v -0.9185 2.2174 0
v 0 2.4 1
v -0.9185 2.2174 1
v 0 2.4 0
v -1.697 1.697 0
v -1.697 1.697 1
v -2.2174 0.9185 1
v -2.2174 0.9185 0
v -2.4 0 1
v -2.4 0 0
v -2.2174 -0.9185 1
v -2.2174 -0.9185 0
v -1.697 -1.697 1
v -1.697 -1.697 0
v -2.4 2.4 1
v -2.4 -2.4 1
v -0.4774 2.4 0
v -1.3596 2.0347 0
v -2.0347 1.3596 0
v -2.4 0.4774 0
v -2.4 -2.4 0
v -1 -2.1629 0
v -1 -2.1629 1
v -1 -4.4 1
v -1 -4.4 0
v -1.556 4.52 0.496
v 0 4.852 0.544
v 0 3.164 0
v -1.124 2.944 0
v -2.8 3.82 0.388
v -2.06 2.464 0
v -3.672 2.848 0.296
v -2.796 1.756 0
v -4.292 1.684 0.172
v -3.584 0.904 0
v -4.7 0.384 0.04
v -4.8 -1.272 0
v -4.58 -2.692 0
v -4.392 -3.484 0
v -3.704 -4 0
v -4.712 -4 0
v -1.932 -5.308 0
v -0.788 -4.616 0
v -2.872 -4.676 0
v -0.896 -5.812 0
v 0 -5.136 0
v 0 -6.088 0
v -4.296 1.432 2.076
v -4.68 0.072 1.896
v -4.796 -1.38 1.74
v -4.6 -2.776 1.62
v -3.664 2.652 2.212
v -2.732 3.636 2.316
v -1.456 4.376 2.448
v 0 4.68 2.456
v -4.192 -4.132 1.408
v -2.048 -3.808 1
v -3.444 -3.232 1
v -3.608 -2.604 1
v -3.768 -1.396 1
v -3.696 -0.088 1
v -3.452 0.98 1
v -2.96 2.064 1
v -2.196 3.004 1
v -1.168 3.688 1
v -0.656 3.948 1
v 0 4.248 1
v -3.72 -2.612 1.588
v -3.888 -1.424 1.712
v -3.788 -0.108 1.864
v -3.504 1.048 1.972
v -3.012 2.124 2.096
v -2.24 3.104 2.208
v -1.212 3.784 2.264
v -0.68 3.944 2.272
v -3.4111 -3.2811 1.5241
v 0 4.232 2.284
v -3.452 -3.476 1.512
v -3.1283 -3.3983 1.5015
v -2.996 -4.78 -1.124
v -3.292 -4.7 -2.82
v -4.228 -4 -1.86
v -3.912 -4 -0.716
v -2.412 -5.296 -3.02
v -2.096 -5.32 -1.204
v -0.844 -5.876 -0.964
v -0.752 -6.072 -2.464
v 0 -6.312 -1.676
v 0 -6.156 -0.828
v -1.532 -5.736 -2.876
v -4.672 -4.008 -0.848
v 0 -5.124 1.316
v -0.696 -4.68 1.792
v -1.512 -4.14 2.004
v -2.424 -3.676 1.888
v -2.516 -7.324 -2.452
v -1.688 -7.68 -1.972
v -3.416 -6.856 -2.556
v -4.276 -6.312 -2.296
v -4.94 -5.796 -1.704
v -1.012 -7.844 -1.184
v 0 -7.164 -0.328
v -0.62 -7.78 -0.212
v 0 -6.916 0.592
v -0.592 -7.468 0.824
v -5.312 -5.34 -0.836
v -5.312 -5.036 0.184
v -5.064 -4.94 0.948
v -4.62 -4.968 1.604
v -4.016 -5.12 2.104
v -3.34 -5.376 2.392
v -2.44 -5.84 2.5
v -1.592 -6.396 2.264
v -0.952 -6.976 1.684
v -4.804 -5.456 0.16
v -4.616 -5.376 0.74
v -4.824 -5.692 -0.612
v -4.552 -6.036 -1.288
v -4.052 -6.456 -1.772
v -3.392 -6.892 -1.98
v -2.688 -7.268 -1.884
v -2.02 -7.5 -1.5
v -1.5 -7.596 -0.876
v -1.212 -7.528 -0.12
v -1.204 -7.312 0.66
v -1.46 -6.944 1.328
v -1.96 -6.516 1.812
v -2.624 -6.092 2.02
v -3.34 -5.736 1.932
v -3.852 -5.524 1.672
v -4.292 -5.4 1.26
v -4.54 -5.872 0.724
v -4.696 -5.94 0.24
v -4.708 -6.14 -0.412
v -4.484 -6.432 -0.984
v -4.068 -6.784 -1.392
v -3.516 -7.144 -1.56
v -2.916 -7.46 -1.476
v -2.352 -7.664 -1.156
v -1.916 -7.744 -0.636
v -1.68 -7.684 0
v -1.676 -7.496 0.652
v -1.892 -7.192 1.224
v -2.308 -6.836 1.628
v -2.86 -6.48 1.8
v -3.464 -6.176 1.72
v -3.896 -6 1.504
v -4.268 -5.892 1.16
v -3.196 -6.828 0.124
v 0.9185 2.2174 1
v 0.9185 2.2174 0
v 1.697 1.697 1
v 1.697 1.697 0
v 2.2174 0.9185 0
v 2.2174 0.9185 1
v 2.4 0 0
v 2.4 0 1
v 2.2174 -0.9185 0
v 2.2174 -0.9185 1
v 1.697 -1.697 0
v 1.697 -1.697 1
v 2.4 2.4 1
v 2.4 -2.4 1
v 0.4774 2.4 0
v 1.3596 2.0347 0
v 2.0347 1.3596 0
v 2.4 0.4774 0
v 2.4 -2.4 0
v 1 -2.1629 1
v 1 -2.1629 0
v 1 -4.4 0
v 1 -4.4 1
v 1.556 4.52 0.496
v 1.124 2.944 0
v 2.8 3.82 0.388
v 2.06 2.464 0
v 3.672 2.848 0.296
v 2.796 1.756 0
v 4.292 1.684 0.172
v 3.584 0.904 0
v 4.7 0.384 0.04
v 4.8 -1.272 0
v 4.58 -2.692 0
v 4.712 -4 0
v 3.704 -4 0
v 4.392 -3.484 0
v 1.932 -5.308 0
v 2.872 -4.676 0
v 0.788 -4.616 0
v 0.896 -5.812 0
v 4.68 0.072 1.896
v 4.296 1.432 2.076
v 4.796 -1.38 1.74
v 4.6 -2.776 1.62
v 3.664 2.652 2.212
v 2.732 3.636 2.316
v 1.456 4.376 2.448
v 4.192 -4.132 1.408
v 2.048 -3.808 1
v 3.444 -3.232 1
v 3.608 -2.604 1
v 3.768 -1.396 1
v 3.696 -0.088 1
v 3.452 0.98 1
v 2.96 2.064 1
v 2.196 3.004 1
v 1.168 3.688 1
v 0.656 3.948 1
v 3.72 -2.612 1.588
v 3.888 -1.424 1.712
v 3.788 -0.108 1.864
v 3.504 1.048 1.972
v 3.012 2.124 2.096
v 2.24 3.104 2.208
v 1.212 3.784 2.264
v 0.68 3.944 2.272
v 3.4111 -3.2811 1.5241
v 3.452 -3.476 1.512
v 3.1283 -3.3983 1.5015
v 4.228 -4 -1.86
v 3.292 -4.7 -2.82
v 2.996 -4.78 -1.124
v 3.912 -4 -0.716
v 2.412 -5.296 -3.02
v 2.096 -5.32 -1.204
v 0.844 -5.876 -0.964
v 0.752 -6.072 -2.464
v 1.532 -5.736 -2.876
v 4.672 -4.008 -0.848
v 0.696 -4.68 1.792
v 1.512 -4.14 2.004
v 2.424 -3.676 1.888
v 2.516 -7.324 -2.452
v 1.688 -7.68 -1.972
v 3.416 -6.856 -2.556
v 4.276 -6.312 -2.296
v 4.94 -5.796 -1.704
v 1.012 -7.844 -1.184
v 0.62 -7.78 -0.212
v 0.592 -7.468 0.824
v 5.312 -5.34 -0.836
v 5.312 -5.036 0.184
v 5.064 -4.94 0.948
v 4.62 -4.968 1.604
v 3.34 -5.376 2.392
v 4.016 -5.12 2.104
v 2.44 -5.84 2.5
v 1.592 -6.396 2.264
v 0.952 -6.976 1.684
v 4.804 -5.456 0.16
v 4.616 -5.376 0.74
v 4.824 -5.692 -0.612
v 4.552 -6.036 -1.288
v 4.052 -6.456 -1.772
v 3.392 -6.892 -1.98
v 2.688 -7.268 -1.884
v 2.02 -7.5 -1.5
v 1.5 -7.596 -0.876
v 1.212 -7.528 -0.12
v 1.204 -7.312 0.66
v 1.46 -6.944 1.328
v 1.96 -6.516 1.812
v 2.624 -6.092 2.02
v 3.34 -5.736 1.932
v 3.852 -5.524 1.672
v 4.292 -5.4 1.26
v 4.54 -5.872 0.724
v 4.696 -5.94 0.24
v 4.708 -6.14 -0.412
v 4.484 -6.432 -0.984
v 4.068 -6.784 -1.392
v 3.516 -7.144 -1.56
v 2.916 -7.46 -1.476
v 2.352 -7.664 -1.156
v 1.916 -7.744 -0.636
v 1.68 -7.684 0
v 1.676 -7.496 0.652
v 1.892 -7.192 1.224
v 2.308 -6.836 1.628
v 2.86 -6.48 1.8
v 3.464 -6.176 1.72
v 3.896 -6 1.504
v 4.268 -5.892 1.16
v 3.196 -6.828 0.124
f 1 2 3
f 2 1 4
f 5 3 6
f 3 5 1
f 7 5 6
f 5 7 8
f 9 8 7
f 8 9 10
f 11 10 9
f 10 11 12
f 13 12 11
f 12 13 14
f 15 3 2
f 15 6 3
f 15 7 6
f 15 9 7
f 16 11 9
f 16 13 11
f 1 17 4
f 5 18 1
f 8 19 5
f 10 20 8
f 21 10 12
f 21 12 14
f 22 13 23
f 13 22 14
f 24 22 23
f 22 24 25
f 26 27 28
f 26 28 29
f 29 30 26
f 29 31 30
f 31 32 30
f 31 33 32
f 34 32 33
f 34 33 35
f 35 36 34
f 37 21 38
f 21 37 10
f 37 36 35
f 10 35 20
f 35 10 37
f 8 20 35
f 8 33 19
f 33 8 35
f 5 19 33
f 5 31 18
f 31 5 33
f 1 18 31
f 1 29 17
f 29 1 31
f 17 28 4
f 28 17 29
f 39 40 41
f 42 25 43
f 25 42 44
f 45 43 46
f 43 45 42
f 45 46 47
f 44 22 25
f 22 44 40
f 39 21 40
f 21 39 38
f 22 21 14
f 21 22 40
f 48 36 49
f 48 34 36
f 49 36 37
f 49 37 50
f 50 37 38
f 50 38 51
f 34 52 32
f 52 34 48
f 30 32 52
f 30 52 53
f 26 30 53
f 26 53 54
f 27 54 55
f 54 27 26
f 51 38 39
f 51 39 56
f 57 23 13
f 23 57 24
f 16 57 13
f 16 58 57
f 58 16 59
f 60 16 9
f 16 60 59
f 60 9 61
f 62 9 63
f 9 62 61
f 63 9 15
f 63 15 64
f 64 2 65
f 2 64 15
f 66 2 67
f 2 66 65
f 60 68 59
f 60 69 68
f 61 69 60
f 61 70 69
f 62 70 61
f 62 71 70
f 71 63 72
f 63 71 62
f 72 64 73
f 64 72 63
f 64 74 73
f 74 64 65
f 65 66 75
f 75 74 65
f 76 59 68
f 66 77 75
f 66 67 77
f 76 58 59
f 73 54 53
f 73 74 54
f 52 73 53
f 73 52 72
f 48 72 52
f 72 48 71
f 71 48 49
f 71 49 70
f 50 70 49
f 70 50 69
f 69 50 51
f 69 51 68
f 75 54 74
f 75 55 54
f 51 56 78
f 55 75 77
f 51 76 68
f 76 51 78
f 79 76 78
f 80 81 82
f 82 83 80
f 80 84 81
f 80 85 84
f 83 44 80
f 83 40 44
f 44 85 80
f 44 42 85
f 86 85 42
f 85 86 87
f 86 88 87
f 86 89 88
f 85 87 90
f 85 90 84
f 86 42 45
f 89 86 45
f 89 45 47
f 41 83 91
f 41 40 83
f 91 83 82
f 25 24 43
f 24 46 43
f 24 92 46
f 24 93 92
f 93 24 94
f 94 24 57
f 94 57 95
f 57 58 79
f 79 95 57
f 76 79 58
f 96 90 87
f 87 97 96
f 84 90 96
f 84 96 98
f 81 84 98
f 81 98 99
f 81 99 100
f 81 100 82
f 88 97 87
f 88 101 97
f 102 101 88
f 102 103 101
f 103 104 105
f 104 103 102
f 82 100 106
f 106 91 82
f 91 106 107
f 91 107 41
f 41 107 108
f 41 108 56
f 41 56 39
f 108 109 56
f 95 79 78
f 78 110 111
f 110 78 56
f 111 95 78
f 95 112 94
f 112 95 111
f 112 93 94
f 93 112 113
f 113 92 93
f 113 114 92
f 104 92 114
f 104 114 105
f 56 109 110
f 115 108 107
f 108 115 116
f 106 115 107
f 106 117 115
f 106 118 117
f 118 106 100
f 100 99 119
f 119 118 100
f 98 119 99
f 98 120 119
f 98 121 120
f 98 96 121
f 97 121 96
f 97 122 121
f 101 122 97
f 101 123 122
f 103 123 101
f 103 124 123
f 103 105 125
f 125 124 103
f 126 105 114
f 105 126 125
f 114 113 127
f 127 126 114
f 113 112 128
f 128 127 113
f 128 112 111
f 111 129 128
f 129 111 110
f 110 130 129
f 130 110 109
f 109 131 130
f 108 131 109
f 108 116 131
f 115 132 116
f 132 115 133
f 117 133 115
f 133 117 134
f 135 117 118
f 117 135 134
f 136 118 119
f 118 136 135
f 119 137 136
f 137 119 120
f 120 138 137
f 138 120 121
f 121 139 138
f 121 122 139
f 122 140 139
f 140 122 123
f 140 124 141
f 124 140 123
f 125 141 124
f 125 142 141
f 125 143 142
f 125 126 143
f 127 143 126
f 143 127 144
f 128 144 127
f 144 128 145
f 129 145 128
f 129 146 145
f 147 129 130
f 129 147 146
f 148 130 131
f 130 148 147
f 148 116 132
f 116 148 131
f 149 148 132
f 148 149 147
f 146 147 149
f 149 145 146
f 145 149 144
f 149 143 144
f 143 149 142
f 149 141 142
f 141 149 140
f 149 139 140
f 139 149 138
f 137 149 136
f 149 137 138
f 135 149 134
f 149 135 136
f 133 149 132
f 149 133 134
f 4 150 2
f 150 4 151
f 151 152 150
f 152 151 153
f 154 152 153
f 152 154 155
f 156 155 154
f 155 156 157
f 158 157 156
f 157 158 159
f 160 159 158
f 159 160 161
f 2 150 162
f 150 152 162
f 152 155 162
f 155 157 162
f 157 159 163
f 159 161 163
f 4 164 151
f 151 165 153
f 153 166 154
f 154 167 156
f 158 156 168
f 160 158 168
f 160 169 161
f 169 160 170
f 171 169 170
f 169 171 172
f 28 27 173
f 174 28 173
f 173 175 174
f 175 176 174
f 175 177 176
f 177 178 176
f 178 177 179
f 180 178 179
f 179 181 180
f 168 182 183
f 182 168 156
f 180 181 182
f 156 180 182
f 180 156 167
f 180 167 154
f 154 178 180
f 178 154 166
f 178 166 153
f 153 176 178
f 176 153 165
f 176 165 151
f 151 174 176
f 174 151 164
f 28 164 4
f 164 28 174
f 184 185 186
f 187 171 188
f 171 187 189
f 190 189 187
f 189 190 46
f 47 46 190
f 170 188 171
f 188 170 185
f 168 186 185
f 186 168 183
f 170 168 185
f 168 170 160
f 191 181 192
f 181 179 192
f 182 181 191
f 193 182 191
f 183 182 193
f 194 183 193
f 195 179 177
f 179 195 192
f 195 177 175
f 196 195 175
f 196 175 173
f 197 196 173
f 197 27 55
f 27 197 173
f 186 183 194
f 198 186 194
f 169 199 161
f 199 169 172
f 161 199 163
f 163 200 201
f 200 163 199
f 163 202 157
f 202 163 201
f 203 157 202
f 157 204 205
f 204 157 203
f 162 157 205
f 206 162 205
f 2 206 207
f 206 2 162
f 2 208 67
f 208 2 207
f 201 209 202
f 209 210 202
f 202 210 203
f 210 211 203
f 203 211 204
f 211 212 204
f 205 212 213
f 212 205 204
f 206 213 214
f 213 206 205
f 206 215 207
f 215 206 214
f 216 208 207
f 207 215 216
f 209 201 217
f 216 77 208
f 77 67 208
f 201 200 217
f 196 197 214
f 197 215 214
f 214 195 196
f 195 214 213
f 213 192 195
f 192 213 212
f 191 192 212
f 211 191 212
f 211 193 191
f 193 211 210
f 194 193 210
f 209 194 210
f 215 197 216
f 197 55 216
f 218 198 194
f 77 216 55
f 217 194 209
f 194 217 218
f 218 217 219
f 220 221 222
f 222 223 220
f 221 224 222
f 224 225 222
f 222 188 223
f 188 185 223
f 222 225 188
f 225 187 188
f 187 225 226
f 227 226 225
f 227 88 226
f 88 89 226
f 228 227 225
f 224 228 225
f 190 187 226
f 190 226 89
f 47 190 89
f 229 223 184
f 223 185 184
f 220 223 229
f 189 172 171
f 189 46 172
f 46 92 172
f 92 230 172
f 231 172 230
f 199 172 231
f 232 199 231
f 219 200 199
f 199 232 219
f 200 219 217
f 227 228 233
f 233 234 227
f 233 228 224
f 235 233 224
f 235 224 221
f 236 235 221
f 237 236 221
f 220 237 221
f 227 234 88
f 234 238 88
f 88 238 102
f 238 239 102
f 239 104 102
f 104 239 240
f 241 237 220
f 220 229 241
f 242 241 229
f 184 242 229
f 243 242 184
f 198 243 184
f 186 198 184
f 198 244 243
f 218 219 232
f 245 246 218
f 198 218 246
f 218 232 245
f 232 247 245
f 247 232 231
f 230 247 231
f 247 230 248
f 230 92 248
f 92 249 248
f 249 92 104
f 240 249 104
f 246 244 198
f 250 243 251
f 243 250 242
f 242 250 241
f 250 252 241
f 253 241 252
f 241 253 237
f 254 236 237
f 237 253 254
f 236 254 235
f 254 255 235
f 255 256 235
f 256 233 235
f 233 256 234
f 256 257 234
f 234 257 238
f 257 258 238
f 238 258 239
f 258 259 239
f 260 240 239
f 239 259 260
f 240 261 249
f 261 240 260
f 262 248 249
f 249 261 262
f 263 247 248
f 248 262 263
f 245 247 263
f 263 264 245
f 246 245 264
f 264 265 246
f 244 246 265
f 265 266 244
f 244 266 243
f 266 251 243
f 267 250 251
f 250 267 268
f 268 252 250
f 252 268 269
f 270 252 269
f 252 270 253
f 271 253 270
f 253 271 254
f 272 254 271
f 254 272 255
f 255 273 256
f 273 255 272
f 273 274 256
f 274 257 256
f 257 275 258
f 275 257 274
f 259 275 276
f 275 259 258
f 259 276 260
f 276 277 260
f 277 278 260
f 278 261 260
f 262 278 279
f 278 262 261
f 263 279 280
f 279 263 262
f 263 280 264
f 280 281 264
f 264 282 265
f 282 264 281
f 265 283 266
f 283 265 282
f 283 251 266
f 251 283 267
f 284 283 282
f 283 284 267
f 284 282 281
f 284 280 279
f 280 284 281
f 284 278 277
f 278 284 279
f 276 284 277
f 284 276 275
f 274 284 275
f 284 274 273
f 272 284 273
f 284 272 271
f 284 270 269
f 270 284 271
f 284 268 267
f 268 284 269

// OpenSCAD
use <../lib.scad>
use <s/66913s01.scad>
function ldraw_lib__66913() = [
// 0 Minifig Headset Around Neck
// 0 Name: 66913.dat
// 0 Author: Gerald Lasser [GeraldLasser]
// 0 !LDRAW_ORG Part UPDATE 2024-04
// 0 !LICENSE Licensed under CC BY 4.0 : see CAreadme.txt
// 
// 0 BFC CERTIFY CCW
  [0,"BFC","CERTIFY"],
  [0,"BFC","CCW"],
// 
// 0 !CATEGORY Minifig Neckwear
// 0 !KEYWORDS cover, Earmuff, Protection
// 
// 0 !HISTORY 2022-01-19 {LEGO Instructions App} Original part shape
// 0 !HISTORY 2022-01-19 [GeraldLasser] File preparation for LDraw Parts Tracker
// 0 !HISTORY 2024-05-28 [OrionP] Official Update 2024-04
// 
// 
// 1 16 0 0 0 1 0 0 0 1 0 0 0 1 s\66913s01.dat
  [1,16,0,0,0,1,0,0,0,1,0,0,0,1, ldraw_lib__s__66913s01()],
// 1 16 0 0 0 -1 0 0 0 1 0 0 0 1 s\66913s01.dat
  [1,16,0,0,0,-1,0,0,0,1,0,0,0,1, ldraw_lib__s__66913s01()],
// 
// 2 24 0 -3.29 -12.81 0 -1.48 -17.29
  [2,24,0,-3.29,-12.81,0,-1.48,-17.29],
// 2 24 0 -1.48 -17.29 0 .82 -17.91
  [2,24,0,-1.48,-17.29,0,.82,-17.91],
// 2 24 0 .82 -17.91 0 4.19 -15.78
  [2,24,0,.82,-17.91,0,4.19,-15.78],
// 2 24 0 -3.29 -12.81 0 0 -12.84
  [2,24,0,-3.29,-12.81,0,0,-12.84],
// 5 24 0 2.07 -15.39 0 4.19 -15.78 -2.11 2.41 -14.69 2.11 2.41 -14.69
  [5,24,0,2.07,-15.39,0,4.19,-15.78,-2.11,2.41,-14.69,2.11,2.41,-14.69],
// 5 24 0 -2.5 10.62 0 -5.71 10.58 1.64 -2.5 9.87 -1.64 -2.5 9.87
  [5,24,0,-2.5,10.62,0,-5.71,10.58,1.64,-2.5,9.87,-1.64,-2.5,9.87],
// 5 24 0 -1.36 12.13 0 0 7.91 3.89 -1.24 11.3 -3.89 -1.24 11.3
  [5,24,0,-1.36,12.13,0,0,7.91,3.89,-1.24,11.3,-3.89,-1.24,11.3],
// 5 24 0 0 -15.22 0 2.07 -15.39 -2.24 0 -14.53 2.24 0 -14.53
  [5,24,0,0,-15.22,0,2.07,-15.39,-2.24,0,-14.53,2.24,0,-14.53],
// 5 24 0 -5.71 10.58 0 -6.14 11.7 1.7 -5.68 9.86 -1.7 -5.68 9.86
  [5,24,0,-5.71,10.58,0,-6.14,11.7,1.7,-5.68,9.86,-1.7,-5.68,9.86],
// 5 24 0 -6.14 11.7 0 -1.36 12.13 3.89 -1.24 11.3 -3.89 -1.24 11.3
  [5,24,0,-6.14,11.7,0,-1.36,12.13,3.89,-1.24,11.3,-3.89,-1.24,11.3],
];
module ldraw_lib__66913(step=0, col=false, unit=2/5, alt=false, line=0.2, solid=!$preview)
    makepoly(ldraw_lib__66913(), step=step, col=col, unit=unit, alt=alt, line=line, solid=solid);
ldraw_lib__66913(line=0.2);
